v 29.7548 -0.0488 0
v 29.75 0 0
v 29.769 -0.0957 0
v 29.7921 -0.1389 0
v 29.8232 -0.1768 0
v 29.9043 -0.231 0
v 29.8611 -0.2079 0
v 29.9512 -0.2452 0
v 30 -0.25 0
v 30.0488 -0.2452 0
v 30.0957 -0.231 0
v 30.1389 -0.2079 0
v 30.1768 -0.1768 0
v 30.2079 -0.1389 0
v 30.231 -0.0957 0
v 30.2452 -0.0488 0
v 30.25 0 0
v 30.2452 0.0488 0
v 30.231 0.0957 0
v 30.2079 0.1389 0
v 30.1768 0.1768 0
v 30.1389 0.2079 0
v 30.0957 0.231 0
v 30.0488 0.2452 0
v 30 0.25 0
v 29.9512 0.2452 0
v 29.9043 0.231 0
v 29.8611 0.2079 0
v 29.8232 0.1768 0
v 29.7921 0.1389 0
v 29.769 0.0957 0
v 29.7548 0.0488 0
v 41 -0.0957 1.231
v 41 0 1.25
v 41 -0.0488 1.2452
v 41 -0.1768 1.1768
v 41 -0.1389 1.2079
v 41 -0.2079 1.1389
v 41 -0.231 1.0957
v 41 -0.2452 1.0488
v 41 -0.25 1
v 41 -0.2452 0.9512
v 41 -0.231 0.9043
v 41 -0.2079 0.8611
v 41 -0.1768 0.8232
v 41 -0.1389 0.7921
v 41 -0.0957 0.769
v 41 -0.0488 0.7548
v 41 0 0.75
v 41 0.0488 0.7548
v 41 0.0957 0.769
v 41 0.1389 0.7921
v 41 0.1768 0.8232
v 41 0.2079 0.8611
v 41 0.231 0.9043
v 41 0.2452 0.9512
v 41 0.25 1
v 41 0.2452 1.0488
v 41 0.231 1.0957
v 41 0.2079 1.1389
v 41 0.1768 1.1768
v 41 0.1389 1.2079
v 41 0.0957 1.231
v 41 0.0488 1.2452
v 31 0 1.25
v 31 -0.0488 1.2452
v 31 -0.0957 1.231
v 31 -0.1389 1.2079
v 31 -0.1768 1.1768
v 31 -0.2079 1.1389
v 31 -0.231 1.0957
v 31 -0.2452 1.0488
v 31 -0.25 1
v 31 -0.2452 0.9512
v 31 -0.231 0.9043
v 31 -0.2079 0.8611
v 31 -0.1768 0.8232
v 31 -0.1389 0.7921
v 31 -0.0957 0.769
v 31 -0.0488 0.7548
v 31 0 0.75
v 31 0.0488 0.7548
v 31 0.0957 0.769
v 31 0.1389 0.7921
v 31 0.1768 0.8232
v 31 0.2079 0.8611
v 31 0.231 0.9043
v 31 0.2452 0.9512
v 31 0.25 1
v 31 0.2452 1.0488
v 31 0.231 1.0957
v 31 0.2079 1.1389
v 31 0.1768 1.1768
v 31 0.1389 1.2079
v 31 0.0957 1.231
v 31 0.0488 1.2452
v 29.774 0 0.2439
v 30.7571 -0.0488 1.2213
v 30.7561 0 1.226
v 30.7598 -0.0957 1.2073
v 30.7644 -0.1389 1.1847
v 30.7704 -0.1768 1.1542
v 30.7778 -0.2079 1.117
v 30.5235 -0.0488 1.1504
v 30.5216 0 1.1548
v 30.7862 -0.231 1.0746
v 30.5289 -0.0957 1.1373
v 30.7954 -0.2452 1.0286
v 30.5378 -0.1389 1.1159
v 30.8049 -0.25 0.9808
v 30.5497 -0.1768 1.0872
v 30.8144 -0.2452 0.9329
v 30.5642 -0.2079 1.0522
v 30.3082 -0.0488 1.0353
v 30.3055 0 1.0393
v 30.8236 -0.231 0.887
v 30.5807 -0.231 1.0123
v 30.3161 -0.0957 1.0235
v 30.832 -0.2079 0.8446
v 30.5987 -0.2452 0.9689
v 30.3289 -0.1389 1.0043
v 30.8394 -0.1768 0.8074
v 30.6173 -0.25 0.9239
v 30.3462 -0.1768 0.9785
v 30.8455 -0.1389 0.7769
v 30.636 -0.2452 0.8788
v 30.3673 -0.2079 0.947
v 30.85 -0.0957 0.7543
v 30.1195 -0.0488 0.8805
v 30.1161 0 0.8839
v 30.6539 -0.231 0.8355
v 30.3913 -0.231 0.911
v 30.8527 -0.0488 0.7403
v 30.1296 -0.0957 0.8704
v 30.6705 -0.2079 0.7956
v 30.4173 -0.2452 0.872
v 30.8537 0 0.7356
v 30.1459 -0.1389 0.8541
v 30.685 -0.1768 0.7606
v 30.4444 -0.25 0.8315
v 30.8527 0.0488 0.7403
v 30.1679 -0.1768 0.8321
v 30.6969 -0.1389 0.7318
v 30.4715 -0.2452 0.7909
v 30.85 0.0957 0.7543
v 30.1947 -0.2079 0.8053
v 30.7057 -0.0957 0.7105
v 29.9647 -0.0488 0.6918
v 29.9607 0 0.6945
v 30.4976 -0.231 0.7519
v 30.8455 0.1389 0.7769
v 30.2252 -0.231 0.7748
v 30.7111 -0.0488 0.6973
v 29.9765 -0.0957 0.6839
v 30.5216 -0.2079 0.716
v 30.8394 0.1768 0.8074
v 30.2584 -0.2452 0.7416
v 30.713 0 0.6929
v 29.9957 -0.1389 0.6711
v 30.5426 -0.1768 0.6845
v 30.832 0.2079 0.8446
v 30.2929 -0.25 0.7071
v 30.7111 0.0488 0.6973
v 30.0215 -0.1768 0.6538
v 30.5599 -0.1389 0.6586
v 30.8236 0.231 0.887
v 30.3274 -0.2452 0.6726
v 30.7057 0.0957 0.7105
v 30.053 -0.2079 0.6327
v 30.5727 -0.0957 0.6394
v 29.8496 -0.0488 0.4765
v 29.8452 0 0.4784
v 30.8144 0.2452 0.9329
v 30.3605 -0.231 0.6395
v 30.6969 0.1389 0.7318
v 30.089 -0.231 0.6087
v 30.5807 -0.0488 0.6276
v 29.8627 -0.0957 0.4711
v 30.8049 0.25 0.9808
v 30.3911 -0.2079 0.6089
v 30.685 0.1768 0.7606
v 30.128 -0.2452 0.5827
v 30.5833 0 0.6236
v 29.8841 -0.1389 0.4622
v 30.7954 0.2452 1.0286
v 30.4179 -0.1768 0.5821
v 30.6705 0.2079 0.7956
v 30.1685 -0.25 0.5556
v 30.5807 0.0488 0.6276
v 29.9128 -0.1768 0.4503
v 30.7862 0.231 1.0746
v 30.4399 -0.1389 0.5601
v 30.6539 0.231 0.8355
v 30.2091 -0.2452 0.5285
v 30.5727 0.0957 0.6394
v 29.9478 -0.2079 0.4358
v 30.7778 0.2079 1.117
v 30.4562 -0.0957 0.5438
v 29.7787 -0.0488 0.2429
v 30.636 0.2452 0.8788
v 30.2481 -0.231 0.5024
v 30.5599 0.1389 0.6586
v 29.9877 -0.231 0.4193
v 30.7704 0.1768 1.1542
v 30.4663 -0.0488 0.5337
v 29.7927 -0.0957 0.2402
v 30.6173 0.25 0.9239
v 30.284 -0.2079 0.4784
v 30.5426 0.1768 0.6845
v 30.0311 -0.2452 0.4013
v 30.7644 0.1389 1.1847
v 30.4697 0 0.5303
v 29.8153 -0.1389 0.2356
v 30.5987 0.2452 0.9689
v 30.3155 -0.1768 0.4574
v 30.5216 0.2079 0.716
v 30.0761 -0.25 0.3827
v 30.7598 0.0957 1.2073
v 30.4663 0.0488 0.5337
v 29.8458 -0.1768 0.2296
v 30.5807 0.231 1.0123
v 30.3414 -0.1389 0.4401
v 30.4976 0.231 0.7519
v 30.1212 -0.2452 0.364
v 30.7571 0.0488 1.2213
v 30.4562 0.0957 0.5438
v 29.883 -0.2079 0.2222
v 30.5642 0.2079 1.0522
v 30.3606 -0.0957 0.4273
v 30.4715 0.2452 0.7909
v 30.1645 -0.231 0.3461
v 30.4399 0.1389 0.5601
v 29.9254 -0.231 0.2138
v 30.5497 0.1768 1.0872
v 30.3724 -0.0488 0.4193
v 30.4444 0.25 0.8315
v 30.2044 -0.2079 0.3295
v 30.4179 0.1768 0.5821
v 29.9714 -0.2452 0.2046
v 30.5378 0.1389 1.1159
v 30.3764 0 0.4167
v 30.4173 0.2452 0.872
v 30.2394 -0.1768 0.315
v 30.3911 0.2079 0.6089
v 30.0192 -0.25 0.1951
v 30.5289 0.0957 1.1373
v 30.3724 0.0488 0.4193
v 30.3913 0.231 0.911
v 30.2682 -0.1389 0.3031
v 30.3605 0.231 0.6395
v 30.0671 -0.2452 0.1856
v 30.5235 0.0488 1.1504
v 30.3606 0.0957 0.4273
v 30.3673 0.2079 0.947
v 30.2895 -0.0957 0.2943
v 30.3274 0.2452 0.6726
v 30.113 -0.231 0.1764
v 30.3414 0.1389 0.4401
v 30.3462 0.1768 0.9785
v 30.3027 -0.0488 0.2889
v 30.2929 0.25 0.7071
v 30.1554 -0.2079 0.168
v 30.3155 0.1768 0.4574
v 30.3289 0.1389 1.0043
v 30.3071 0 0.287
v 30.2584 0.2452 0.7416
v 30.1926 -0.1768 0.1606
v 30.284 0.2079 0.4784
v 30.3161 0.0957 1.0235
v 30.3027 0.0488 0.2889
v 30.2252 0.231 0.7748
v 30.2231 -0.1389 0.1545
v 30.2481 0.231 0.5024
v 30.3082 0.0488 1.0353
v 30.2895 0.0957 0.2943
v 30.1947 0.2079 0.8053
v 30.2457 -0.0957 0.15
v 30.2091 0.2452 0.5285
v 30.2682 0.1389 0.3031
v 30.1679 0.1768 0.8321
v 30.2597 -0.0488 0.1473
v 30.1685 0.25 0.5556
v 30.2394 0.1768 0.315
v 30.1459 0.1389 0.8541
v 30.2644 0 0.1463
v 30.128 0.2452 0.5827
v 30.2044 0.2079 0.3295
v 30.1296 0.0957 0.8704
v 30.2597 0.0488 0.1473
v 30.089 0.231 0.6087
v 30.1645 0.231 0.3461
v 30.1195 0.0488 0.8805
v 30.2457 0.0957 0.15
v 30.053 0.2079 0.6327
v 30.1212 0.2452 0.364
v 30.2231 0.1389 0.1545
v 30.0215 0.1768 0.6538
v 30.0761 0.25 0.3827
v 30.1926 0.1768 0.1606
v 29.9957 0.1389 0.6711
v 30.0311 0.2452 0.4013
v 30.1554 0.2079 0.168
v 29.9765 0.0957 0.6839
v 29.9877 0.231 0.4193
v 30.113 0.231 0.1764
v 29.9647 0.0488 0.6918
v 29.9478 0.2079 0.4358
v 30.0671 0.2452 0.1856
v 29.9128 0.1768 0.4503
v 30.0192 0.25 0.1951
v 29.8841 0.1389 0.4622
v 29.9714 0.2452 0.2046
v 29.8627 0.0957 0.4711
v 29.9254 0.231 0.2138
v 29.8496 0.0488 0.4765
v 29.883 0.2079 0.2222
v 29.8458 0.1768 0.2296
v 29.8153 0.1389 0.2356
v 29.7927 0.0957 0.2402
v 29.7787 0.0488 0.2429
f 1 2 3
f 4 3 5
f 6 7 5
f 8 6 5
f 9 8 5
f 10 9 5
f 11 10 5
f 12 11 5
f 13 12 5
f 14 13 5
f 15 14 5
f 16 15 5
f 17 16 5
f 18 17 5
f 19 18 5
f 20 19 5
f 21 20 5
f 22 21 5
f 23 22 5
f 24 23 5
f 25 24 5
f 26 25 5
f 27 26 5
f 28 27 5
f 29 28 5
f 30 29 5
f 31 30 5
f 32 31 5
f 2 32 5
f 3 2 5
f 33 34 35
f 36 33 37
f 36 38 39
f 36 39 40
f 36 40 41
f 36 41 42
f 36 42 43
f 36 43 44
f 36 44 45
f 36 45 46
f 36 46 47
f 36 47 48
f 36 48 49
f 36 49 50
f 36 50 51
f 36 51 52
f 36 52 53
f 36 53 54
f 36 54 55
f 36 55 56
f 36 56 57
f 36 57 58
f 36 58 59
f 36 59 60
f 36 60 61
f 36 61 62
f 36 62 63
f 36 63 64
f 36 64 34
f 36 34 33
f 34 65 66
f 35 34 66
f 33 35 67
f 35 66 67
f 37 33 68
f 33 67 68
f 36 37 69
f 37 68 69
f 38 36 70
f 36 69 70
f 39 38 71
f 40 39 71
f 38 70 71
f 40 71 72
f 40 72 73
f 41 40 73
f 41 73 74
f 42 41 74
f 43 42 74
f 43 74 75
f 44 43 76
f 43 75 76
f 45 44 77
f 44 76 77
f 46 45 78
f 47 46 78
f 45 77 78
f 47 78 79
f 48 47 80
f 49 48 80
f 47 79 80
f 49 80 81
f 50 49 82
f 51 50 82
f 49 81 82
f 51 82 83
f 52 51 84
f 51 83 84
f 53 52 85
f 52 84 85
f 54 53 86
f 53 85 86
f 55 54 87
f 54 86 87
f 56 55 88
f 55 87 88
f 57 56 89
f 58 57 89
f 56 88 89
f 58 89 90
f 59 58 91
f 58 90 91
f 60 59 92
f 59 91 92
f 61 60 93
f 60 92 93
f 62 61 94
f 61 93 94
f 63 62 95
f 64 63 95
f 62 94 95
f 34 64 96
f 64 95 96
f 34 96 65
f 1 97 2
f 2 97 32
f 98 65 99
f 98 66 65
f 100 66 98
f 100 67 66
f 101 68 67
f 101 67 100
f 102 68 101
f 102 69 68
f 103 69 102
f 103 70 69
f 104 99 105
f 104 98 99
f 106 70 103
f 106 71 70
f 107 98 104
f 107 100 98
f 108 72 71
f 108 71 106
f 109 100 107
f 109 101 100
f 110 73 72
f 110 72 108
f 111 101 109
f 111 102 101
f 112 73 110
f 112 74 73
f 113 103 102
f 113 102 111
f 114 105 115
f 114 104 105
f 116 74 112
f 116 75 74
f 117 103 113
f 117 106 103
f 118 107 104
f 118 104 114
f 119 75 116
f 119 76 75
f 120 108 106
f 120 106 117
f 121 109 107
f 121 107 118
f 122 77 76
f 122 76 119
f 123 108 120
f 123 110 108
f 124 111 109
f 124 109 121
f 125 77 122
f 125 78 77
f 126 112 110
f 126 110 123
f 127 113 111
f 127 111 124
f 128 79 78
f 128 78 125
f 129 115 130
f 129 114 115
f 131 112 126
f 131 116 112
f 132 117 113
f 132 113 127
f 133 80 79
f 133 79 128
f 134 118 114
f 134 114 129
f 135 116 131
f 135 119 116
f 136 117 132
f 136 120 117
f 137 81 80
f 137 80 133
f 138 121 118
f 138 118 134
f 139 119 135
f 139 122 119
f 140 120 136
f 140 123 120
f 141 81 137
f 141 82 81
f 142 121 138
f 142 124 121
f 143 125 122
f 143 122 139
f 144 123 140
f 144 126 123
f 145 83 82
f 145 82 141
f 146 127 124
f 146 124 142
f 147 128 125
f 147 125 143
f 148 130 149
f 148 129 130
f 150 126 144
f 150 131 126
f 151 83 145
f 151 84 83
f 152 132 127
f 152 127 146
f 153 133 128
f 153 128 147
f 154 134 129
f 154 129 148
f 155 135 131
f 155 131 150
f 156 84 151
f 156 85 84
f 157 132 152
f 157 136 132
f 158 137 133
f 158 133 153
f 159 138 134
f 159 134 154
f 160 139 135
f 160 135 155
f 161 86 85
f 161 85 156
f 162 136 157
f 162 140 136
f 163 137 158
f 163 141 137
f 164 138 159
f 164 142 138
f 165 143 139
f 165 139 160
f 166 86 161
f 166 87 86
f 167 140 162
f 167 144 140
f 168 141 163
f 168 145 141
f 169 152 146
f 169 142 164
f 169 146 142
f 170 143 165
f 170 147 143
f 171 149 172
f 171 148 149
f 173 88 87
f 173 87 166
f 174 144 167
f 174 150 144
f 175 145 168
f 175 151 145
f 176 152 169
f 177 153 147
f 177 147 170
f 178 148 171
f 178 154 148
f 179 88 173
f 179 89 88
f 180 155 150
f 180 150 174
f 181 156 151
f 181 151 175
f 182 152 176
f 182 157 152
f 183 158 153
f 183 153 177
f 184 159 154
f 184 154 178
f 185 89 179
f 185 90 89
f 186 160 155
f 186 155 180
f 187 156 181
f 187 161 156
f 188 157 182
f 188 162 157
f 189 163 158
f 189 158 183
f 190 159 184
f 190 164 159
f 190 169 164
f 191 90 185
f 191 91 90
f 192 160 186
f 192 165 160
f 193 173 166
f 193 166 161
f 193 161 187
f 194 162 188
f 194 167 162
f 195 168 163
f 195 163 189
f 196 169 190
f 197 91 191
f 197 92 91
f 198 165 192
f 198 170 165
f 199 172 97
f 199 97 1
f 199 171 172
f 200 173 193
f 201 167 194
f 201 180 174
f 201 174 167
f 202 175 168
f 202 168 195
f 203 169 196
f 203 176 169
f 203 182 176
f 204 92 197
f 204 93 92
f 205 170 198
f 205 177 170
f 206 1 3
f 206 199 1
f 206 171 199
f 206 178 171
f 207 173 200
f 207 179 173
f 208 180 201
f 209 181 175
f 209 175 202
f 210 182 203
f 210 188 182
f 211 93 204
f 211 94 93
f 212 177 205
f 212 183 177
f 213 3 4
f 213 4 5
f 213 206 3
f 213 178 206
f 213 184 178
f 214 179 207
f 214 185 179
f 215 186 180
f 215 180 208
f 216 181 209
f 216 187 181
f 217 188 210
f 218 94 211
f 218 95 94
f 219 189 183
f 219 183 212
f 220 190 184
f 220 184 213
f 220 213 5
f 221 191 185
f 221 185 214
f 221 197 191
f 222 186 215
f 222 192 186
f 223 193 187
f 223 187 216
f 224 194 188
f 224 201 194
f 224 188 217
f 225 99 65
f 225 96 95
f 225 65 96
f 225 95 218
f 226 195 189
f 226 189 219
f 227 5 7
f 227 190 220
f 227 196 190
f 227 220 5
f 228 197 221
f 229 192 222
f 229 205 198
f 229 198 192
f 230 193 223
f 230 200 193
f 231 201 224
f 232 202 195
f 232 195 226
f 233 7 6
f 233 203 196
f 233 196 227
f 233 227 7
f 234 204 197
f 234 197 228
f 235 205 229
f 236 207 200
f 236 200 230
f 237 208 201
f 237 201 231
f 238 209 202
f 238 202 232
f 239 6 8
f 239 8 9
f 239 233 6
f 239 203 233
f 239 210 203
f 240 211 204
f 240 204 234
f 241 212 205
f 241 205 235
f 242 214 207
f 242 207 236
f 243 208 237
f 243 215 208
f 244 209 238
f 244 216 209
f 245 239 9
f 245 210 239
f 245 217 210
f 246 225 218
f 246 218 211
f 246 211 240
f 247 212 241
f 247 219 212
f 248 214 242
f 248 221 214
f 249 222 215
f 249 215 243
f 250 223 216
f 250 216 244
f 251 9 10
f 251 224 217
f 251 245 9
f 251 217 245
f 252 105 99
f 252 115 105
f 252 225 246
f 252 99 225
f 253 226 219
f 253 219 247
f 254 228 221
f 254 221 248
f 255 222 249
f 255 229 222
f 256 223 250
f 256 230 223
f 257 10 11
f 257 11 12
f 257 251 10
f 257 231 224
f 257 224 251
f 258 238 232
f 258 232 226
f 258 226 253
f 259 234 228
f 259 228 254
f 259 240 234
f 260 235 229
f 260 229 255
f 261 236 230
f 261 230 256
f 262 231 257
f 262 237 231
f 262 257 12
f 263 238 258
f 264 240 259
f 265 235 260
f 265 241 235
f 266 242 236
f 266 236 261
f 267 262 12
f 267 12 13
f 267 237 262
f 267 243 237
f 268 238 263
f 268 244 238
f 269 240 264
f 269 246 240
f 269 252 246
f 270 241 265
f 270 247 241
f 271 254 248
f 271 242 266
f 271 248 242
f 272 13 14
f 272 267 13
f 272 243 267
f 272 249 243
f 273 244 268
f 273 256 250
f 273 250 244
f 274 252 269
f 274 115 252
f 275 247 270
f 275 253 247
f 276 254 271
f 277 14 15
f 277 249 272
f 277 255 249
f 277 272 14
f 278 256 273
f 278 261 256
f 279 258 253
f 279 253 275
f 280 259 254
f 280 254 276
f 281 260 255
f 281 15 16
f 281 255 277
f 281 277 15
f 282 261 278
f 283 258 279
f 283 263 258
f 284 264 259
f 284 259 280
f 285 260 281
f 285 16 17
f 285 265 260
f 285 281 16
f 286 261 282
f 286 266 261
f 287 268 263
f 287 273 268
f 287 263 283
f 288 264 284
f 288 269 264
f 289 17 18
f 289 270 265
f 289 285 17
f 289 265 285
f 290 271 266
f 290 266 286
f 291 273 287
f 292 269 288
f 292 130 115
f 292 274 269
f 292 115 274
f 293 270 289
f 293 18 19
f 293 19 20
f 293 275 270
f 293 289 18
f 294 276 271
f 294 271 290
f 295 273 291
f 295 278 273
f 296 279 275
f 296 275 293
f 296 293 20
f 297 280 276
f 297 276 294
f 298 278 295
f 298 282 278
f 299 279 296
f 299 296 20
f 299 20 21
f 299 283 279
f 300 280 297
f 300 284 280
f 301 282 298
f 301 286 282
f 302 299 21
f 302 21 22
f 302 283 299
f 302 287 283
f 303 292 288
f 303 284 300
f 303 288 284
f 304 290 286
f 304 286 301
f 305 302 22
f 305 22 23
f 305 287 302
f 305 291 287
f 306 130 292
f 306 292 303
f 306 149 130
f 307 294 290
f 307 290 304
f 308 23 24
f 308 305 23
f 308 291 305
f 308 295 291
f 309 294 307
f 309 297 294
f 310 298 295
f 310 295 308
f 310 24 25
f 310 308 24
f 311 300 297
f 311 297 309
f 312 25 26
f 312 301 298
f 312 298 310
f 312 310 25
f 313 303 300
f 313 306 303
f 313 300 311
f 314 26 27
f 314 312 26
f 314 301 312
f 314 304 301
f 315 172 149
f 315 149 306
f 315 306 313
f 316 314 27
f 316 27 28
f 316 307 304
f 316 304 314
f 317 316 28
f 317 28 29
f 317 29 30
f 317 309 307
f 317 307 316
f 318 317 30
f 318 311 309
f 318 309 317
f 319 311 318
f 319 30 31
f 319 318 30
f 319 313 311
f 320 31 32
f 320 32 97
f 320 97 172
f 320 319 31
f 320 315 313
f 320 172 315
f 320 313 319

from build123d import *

# Parameters (mm, degrees)
TORUS_R                = 0.25
TORUS_ANGLE            = 90
CYLINDER_R             = 0.25
CYLINDER_DEPTH         = 10
FUSION_PITCH_ANGLE     = -90
FUSION_PLACEMENT_ANGLE = 90


with BuildPart() as torus:
    # Torus → Torus (revolve)
    with BuildSketch(Plane.XZ):
        with Locations((1, 0)):
            Circle(TORUS_R)
    revolve(axis=Axis((0, 0, 0), (0, 0, 1)), revolution_arc=TORUS_ANGLE)


with BuildPart() as fusion:
    # Cylinder → Cylinder (new body)
    with BuildSketch(Plane(origin=(1, 0, 0), x_dir=(1, 0, 0), z_dir=(0, -1, 0))):
        Circle(CYLINDER_R)
    extrude(amount=CYLINDER_DEPTH)

    # Fusion: union Torus
    add(torus.part)


with BuildPart() as fusion_1:
    # Fusion pitch: moved
    add(fusion.part.rotate(Axis((0, 0, 0), (0, 1, 0)), FUSION_PITCH_ANGLE))


with BuildPart() as fusion_2:
    # Fusion placement: moved
    add(fusion_1.part.moved(Location((31, 0, 0))).rotate(Axis((31, 0, 0), (0, 0, 1)), FUSION_PLACEMENT_ANGLE))


solid = fusion_2.part
